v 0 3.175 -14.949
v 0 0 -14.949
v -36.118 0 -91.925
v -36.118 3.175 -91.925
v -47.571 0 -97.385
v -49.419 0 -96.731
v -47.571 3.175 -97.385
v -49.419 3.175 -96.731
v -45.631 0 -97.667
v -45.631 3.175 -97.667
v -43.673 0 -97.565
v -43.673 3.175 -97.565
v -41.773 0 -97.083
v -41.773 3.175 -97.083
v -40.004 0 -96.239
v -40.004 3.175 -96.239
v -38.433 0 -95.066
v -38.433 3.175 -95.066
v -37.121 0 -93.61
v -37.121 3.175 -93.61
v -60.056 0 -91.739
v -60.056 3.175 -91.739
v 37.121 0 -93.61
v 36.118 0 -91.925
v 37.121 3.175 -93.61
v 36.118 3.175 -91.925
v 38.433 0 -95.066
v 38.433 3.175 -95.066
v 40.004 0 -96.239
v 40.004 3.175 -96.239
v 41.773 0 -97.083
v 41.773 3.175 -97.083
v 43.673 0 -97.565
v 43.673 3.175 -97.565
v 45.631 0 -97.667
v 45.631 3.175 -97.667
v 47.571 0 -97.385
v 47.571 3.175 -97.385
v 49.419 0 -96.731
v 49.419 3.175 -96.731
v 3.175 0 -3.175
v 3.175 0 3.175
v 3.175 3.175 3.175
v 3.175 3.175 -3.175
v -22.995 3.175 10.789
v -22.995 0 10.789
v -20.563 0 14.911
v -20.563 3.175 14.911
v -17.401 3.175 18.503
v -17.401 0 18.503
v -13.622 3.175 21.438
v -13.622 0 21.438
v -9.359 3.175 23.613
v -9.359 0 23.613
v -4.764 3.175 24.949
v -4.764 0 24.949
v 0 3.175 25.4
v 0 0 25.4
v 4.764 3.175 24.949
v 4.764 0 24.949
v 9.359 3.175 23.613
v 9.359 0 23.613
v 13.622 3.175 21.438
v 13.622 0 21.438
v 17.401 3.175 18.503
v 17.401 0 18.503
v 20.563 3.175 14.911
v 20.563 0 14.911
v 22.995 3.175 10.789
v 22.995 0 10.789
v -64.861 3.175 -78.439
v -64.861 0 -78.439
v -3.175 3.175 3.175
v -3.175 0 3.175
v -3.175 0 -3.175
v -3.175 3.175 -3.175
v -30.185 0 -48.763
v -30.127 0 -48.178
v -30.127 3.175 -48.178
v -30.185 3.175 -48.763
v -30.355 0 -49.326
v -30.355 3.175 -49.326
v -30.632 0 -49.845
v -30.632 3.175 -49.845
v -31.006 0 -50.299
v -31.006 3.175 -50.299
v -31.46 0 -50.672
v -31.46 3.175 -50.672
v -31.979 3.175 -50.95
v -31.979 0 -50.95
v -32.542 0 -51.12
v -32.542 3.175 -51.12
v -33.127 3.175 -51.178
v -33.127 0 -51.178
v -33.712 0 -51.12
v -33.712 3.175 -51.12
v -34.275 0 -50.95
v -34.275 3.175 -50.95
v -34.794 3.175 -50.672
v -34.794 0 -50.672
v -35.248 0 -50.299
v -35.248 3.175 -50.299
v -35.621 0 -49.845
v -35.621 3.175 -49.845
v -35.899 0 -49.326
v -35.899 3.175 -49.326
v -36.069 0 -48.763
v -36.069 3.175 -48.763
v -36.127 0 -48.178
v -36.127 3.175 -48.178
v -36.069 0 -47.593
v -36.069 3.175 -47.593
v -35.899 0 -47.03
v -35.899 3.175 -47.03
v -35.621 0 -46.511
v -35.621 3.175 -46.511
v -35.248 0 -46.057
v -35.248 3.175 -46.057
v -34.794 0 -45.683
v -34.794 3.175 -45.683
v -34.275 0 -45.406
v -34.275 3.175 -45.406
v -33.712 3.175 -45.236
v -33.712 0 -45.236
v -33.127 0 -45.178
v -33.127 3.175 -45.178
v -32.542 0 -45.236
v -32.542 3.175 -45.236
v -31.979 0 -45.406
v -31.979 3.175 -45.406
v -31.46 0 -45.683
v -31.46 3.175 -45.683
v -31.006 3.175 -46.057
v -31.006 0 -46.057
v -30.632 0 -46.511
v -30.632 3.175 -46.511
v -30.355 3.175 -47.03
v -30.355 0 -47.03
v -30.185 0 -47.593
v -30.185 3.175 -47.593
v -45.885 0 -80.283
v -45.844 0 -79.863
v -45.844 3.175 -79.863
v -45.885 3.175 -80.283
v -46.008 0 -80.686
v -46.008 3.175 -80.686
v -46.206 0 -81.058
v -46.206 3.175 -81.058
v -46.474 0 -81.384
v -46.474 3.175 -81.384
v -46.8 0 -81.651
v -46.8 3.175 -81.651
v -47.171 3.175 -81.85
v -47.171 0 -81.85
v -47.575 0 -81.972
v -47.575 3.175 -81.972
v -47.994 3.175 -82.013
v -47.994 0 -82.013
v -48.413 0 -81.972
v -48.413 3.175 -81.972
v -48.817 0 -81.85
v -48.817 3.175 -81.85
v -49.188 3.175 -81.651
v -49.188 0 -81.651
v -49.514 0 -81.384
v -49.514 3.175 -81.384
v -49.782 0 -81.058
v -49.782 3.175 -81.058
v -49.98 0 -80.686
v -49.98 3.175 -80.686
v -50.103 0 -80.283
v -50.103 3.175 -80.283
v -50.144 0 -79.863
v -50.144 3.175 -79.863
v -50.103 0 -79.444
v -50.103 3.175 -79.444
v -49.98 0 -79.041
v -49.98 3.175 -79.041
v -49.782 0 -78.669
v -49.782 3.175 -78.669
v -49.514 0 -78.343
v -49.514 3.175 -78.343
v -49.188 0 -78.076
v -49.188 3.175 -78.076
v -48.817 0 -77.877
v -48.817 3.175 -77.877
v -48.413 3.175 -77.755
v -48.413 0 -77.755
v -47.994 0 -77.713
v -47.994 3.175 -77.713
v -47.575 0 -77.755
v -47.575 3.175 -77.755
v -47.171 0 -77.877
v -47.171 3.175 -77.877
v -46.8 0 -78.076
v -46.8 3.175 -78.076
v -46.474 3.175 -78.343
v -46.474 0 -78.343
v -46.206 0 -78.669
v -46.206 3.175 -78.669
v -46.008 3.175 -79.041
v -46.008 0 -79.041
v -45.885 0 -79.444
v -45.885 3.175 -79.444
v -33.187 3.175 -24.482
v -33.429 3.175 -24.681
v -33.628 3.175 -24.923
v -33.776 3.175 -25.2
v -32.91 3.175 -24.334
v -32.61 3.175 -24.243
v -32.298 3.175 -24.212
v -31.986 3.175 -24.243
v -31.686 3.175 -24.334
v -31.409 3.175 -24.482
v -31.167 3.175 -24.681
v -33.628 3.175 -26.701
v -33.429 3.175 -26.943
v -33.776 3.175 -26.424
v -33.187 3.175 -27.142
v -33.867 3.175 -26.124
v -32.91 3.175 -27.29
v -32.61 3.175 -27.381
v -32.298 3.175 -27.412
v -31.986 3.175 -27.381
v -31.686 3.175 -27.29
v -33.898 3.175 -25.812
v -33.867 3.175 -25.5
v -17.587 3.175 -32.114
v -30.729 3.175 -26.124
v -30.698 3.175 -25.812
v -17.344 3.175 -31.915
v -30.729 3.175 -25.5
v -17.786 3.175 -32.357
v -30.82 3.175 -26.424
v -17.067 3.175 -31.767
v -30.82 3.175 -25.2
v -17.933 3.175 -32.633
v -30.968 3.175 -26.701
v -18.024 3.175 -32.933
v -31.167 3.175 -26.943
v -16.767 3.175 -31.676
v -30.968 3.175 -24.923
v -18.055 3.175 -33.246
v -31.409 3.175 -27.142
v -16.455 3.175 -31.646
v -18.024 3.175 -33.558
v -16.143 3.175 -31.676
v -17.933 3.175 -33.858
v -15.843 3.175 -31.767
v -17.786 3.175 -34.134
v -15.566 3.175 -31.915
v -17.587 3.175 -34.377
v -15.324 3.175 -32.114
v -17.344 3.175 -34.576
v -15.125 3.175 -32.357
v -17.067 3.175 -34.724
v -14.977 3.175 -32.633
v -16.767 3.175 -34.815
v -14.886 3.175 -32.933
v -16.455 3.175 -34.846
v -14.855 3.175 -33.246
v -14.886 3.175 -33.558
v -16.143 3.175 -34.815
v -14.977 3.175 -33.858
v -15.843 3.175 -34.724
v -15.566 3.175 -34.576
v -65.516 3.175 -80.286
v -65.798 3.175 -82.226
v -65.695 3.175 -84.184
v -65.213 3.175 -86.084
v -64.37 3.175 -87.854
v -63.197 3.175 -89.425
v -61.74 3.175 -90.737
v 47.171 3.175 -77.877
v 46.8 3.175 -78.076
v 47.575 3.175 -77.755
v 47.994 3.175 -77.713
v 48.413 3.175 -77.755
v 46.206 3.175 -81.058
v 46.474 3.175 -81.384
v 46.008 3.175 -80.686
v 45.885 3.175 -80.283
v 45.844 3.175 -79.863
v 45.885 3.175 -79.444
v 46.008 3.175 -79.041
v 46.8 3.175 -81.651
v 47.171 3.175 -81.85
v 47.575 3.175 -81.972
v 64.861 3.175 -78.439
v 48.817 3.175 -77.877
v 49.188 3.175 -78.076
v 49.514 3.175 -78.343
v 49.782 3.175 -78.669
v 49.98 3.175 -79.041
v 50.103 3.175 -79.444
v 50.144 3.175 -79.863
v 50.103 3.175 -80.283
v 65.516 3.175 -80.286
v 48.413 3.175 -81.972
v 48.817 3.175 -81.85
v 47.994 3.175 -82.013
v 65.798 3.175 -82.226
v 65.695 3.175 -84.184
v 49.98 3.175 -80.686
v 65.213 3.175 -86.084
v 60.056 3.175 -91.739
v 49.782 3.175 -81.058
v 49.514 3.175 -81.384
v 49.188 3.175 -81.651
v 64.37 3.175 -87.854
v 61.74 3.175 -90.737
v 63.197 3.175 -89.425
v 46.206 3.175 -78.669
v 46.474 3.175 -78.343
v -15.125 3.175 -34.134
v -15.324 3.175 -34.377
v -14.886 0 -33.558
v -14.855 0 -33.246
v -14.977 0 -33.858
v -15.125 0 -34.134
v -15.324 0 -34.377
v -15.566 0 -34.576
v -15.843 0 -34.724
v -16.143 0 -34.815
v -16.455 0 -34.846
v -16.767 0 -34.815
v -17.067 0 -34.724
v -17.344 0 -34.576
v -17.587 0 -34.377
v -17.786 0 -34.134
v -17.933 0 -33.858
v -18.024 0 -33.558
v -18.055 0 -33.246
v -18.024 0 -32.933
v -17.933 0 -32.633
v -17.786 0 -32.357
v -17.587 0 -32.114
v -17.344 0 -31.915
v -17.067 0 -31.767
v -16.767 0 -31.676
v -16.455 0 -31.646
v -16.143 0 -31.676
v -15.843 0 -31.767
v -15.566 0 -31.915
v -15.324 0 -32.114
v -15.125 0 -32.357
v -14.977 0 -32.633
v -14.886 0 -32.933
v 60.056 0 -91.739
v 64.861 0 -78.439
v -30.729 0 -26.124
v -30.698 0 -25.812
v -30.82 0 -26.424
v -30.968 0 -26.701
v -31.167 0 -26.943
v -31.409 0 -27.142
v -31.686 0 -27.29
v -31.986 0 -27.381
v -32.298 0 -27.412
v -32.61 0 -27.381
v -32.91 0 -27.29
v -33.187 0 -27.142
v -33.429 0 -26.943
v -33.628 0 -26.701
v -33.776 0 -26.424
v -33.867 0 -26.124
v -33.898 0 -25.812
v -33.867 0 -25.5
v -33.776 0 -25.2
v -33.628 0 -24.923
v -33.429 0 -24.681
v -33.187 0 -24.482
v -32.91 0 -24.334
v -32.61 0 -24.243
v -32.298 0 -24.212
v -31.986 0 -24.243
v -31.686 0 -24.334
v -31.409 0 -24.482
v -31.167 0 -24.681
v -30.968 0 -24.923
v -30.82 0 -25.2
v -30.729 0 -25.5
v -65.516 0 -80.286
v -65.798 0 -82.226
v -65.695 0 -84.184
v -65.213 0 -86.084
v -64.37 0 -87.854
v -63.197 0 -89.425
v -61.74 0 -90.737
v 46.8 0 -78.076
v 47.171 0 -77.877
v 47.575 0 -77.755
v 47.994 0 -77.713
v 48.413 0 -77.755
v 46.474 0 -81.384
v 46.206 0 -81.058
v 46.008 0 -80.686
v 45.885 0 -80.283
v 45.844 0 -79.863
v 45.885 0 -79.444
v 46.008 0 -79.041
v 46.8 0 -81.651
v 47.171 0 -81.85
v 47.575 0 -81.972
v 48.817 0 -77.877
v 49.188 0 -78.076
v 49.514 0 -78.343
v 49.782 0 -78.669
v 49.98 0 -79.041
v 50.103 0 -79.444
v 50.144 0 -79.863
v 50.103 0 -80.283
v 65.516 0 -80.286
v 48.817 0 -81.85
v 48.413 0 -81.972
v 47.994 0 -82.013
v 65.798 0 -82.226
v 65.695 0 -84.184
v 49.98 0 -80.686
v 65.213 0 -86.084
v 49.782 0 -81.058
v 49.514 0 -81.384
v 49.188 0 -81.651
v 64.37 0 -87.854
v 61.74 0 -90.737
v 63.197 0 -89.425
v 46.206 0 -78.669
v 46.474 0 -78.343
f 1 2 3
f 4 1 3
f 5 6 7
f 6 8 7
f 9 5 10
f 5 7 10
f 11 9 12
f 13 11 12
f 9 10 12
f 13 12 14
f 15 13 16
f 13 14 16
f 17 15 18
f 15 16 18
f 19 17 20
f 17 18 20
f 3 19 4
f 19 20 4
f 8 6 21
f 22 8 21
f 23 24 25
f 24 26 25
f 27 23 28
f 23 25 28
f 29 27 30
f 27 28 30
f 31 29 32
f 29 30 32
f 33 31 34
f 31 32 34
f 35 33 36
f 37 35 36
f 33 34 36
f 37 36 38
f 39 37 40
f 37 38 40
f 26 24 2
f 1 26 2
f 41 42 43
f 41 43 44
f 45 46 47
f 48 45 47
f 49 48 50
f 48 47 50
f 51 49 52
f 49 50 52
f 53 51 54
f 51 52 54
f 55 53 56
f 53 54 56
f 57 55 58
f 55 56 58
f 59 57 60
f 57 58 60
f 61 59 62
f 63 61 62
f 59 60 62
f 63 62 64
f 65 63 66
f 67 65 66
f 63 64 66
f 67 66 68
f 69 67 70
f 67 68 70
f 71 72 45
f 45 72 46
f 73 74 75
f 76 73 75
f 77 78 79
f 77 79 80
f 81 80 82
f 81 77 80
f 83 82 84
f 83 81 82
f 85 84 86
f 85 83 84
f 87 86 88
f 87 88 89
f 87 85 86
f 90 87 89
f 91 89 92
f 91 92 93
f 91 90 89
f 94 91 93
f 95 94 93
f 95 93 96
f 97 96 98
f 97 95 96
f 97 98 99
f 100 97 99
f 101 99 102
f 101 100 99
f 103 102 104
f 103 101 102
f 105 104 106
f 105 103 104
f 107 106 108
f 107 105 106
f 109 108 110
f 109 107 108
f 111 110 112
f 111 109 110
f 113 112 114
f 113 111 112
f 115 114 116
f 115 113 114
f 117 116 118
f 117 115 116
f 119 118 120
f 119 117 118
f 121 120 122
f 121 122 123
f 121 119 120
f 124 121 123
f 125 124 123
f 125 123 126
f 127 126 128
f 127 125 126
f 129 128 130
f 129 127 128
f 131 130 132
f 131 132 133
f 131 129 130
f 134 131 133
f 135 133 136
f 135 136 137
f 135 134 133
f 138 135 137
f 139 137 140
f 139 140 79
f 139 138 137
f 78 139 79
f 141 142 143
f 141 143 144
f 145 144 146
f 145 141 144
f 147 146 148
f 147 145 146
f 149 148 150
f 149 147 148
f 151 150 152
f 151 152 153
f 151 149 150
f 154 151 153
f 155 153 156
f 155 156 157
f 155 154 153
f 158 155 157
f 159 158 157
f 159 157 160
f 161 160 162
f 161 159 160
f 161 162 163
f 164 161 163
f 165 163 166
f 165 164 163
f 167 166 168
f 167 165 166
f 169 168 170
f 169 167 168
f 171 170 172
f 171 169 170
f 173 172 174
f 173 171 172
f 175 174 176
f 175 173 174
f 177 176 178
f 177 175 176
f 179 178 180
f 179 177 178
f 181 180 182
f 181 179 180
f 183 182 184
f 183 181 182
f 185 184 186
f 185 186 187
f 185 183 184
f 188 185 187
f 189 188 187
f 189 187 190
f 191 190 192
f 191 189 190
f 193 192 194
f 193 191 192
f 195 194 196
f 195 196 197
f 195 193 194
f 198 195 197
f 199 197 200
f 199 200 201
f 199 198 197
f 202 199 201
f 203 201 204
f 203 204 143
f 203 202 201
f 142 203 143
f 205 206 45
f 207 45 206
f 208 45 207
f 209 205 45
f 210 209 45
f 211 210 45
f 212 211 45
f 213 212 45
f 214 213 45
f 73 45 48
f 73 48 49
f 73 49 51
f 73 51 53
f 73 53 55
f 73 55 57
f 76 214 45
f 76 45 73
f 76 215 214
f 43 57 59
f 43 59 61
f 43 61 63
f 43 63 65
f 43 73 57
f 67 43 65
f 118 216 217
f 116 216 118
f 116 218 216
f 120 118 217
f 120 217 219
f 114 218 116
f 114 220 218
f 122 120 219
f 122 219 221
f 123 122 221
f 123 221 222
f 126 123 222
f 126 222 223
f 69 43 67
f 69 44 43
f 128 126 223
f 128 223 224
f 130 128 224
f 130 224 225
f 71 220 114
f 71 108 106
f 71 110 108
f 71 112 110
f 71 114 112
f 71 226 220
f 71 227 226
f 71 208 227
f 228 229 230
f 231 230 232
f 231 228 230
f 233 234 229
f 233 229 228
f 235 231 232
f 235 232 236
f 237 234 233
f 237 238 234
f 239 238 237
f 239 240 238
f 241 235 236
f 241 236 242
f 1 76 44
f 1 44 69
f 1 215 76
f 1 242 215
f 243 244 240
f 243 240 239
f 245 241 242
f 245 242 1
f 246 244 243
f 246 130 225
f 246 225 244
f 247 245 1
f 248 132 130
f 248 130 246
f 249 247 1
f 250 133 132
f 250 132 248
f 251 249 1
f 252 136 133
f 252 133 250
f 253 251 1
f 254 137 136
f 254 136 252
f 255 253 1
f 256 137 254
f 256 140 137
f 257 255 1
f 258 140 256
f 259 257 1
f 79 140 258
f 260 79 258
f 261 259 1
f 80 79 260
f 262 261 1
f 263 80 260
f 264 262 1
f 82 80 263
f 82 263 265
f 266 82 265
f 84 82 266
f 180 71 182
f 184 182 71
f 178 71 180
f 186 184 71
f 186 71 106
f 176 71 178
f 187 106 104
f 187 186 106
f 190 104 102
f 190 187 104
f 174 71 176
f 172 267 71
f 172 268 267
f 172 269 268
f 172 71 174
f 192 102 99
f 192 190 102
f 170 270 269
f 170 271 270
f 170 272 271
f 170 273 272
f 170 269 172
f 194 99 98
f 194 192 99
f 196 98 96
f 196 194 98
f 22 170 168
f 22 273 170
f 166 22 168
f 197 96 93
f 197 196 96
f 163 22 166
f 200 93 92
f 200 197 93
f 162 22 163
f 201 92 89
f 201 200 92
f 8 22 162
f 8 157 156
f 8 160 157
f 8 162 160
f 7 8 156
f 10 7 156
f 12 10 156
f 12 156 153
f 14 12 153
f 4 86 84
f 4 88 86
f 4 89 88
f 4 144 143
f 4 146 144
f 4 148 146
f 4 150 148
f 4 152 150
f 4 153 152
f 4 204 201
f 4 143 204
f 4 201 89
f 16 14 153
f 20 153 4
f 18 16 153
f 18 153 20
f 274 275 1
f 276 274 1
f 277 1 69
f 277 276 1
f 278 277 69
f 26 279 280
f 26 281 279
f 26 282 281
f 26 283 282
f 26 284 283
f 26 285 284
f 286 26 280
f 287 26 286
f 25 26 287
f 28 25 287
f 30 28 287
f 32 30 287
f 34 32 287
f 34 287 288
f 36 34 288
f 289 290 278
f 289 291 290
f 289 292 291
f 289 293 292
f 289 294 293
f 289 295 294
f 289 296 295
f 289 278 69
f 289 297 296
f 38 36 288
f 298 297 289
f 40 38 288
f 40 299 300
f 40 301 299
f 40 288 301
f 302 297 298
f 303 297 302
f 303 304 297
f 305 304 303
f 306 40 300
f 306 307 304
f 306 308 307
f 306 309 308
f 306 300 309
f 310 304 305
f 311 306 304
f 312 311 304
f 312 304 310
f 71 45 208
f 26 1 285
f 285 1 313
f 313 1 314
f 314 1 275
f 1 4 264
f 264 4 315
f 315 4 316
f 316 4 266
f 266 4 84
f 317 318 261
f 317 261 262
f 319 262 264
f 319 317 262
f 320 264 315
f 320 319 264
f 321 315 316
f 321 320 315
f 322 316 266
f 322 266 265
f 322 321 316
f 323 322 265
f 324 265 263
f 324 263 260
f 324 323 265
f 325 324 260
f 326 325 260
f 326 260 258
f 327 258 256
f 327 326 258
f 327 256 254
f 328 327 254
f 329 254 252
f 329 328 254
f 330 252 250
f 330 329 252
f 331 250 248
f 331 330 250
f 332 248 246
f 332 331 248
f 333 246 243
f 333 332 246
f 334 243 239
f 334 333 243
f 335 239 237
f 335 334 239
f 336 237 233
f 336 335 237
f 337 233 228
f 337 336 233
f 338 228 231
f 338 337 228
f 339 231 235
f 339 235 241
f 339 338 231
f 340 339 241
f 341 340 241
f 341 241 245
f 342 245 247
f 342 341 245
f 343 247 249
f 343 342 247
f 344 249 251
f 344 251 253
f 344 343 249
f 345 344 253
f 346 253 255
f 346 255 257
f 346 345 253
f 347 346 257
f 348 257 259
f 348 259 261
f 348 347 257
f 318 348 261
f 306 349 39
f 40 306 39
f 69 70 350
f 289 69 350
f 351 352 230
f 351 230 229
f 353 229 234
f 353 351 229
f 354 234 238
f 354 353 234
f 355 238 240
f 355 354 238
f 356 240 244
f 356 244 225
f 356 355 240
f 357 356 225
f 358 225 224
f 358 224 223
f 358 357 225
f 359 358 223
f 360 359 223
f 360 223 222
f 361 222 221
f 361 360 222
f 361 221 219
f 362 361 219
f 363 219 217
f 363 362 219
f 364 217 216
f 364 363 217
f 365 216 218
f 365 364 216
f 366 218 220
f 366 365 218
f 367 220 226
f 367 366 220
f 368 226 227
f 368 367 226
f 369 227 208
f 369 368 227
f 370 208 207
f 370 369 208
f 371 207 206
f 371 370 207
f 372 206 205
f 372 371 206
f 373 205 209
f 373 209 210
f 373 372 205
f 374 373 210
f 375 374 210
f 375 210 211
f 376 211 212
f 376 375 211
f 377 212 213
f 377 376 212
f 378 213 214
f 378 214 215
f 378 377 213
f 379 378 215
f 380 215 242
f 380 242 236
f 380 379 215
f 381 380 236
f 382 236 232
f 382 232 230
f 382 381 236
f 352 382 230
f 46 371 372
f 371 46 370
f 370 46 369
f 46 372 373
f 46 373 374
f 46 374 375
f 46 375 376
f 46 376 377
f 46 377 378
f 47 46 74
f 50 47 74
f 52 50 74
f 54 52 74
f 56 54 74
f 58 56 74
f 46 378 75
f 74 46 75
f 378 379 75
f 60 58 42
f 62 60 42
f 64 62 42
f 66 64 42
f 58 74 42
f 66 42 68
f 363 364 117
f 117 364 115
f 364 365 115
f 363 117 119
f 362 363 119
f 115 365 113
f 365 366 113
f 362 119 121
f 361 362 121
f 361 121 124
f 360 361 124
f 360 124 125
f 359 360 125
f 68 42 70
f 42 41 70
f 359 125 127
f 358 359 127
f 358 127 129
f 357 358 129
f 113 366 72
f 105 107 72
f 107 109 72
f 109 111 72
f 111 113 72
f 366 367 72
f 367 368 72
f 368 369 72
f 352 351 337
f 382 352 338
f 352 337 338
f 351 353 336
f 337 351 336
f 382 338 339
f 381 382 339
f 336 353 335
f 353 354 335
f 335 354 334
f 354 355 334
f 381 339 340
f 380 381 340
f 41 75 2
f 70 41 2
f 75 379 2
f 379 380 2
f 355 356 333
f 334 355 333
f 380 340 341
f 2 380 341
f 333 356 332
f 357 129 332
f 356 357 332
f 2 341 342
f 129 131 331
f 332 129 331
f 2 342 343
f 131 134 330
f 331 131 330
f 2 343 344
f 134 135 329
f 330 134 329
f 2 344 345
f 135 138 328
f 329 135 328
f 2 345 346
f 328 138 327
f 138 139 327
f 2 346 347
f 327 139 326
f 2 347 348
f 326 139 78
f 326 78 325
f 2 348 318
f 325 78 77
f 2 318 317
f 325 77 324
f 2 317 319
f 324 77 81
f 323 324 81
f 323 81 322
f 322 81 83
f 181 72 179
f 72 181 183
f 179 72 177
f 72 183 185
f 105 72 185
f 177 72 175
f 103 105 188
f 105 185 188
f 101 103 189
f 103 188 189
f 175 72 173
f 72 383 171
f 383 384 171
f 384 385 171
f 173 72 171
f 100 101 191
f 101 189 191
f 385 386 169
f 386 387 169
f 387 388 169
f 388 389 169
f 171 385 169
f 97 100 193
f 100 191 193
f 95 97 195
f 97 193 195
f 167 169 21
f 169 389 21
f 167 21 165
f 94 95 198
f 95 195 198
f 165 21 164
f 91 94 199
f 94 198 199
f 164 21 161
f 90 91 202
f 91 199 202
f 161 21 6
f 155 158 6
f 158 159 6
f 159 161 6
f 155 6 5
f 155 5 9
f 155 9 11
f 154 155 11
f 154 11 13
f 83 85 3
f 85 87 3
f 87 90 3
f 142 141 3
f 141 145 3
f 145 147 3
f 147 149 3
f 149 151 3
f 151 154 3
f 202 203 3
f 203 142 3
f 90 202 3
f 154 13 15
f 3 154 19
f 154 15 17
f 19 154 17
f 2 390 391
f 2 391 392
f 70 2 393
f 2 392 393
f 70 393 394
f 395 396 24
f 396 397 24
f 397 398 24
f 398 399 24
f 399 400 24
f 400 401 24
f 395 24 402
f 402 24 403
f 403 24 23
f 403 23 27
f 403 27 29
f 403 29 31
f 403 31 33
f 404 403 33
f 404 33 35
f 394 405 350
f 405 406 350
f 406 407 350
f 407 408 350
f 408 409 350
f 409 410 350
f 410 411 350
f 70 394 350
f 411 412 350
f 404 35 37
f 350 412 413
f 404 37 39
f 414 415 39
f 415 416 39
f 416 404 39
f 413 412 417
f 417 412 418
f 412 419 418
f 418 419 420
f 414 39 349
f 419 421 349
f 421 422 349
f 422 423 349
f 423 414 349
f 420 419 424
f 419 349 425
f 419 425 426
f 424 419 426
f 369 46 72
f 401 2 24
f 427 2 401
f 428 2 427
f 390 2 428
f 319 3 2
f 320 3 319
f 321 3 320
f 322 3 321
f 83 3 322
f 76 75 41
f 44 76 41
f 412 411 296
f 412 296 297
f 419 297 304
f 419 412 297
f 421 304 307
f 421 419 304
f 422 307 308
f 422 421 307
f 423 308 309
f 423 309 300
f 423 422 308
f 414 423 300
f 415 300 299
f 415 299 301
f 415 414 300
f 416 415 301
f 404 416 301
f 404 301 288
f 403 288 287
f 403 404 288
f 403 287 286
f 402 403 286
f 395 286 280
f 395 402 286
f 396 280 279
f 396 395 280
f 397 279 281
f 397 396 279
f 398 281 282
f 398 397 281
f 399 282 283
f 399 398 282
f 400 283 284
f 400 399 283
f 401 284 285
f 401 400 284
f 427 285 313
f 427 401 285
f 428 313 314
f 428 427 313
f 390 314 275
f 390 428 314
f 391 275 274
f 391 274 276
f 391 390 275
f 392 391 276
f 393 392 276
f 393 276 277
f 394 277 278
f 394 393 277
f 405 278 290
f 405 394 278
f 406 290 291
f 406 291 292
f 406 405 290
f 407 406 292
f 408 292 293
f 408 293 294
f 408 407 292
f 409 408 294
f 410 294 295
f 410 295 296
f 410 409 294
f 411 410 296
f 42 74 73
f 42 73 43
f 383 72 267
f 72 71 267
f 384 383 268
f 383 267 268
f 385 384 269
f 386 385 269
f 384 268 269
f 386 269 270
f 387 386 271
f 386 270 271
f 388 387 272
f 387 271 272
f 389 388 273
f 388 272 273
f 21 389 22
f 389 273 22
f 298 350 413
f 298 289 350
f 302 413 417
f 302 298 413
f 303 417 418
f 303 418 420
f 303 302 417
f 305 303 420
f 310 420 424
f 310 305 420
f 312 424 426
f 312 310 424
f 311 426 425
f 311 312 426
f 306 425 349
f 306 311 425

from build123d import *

# Parameters (mm, degrees)
SKETCH1_R           = 2.15
SKETCH1_R_2         = 3
SKETCH1_R_3         = 1.6
SKETCH1_W           = 6.35
SKETCH1_H           = 6.35
BOSS_EXTRUDE1_DEPTH = 3.175
FILLET1_R           = 10


with BuildPart() as part:
    # Sketch1 → Boss-Extrude1 (new body)
    with BuildSketch(Plane(origin=(0, 0, 0), x_dir=(1, 0, 0), z_dir=(0, 1, 0))):
        with BuildLine():
            Line((-69.108920632, 87.491689248), (-22.994598309, -10.789274703))
            ThreePointArc((-22.994598309, -10.789274703), (0, -25.4), (22.994598309, -10.789274703))
            Line((22.994598309, -10.789274703), (69.108920632, 87.491689248))
            Line((69.108920632, 87.491689248), (40.365672746, 100.978282626))
            Line((40.365672746, 100.978282626), (0, 14.949104962))
            Line((0, 14.949104962), (-40.365672746, 100.978282626))
            Line((-40.365672746, 100.978282626), (-69.108920632, 87.491689248))
        make_face()
        with Locations((47.994, 79.863361994)):
            Circle(SKETCH1_R, mode=Mode.SUBTRACT)
        with Locations((-47.994, 79.863361994)):
            Circle(SKETCH1_R, mode=Mode.SUBTRACT)
        with Locations((-33.126889189, 48.177891883)):
            Circle(SKETCH1_R_2, mode=Mode.SUBTRACT)
        with Locations((-32.297900068, 25.811951773)):
            Circle(SKETCH1_R_3, mode=Mode.SUBTRACT)
        with Locations((-16.455165013, 33.245507178)):
            Circle(SKETCH1_R_3, mode=Mode.SUBTRACT)
        Rectangle(SKETCH1_W, SKETCH1_H, mode=Mode.SUBTRACT)
    extrude(amount=BOSS_EXTRUDE1_DEPTH)

    # Fillet1
    fillet1_edges = [part.edges().sort_by_distance(p)[0] for p in [
        (-40.365672746, 1.5875, -100.978282626),
        (40.365672746, 1.5875, -100.978282626),
        (69.108920632, 1.5875, -87.491689248),
        (-69.108920632, 1.5875, -87.491689248),
    ]]
    fillet(fillet1_edges, radius=FILLET1_R)


solid = part.part
